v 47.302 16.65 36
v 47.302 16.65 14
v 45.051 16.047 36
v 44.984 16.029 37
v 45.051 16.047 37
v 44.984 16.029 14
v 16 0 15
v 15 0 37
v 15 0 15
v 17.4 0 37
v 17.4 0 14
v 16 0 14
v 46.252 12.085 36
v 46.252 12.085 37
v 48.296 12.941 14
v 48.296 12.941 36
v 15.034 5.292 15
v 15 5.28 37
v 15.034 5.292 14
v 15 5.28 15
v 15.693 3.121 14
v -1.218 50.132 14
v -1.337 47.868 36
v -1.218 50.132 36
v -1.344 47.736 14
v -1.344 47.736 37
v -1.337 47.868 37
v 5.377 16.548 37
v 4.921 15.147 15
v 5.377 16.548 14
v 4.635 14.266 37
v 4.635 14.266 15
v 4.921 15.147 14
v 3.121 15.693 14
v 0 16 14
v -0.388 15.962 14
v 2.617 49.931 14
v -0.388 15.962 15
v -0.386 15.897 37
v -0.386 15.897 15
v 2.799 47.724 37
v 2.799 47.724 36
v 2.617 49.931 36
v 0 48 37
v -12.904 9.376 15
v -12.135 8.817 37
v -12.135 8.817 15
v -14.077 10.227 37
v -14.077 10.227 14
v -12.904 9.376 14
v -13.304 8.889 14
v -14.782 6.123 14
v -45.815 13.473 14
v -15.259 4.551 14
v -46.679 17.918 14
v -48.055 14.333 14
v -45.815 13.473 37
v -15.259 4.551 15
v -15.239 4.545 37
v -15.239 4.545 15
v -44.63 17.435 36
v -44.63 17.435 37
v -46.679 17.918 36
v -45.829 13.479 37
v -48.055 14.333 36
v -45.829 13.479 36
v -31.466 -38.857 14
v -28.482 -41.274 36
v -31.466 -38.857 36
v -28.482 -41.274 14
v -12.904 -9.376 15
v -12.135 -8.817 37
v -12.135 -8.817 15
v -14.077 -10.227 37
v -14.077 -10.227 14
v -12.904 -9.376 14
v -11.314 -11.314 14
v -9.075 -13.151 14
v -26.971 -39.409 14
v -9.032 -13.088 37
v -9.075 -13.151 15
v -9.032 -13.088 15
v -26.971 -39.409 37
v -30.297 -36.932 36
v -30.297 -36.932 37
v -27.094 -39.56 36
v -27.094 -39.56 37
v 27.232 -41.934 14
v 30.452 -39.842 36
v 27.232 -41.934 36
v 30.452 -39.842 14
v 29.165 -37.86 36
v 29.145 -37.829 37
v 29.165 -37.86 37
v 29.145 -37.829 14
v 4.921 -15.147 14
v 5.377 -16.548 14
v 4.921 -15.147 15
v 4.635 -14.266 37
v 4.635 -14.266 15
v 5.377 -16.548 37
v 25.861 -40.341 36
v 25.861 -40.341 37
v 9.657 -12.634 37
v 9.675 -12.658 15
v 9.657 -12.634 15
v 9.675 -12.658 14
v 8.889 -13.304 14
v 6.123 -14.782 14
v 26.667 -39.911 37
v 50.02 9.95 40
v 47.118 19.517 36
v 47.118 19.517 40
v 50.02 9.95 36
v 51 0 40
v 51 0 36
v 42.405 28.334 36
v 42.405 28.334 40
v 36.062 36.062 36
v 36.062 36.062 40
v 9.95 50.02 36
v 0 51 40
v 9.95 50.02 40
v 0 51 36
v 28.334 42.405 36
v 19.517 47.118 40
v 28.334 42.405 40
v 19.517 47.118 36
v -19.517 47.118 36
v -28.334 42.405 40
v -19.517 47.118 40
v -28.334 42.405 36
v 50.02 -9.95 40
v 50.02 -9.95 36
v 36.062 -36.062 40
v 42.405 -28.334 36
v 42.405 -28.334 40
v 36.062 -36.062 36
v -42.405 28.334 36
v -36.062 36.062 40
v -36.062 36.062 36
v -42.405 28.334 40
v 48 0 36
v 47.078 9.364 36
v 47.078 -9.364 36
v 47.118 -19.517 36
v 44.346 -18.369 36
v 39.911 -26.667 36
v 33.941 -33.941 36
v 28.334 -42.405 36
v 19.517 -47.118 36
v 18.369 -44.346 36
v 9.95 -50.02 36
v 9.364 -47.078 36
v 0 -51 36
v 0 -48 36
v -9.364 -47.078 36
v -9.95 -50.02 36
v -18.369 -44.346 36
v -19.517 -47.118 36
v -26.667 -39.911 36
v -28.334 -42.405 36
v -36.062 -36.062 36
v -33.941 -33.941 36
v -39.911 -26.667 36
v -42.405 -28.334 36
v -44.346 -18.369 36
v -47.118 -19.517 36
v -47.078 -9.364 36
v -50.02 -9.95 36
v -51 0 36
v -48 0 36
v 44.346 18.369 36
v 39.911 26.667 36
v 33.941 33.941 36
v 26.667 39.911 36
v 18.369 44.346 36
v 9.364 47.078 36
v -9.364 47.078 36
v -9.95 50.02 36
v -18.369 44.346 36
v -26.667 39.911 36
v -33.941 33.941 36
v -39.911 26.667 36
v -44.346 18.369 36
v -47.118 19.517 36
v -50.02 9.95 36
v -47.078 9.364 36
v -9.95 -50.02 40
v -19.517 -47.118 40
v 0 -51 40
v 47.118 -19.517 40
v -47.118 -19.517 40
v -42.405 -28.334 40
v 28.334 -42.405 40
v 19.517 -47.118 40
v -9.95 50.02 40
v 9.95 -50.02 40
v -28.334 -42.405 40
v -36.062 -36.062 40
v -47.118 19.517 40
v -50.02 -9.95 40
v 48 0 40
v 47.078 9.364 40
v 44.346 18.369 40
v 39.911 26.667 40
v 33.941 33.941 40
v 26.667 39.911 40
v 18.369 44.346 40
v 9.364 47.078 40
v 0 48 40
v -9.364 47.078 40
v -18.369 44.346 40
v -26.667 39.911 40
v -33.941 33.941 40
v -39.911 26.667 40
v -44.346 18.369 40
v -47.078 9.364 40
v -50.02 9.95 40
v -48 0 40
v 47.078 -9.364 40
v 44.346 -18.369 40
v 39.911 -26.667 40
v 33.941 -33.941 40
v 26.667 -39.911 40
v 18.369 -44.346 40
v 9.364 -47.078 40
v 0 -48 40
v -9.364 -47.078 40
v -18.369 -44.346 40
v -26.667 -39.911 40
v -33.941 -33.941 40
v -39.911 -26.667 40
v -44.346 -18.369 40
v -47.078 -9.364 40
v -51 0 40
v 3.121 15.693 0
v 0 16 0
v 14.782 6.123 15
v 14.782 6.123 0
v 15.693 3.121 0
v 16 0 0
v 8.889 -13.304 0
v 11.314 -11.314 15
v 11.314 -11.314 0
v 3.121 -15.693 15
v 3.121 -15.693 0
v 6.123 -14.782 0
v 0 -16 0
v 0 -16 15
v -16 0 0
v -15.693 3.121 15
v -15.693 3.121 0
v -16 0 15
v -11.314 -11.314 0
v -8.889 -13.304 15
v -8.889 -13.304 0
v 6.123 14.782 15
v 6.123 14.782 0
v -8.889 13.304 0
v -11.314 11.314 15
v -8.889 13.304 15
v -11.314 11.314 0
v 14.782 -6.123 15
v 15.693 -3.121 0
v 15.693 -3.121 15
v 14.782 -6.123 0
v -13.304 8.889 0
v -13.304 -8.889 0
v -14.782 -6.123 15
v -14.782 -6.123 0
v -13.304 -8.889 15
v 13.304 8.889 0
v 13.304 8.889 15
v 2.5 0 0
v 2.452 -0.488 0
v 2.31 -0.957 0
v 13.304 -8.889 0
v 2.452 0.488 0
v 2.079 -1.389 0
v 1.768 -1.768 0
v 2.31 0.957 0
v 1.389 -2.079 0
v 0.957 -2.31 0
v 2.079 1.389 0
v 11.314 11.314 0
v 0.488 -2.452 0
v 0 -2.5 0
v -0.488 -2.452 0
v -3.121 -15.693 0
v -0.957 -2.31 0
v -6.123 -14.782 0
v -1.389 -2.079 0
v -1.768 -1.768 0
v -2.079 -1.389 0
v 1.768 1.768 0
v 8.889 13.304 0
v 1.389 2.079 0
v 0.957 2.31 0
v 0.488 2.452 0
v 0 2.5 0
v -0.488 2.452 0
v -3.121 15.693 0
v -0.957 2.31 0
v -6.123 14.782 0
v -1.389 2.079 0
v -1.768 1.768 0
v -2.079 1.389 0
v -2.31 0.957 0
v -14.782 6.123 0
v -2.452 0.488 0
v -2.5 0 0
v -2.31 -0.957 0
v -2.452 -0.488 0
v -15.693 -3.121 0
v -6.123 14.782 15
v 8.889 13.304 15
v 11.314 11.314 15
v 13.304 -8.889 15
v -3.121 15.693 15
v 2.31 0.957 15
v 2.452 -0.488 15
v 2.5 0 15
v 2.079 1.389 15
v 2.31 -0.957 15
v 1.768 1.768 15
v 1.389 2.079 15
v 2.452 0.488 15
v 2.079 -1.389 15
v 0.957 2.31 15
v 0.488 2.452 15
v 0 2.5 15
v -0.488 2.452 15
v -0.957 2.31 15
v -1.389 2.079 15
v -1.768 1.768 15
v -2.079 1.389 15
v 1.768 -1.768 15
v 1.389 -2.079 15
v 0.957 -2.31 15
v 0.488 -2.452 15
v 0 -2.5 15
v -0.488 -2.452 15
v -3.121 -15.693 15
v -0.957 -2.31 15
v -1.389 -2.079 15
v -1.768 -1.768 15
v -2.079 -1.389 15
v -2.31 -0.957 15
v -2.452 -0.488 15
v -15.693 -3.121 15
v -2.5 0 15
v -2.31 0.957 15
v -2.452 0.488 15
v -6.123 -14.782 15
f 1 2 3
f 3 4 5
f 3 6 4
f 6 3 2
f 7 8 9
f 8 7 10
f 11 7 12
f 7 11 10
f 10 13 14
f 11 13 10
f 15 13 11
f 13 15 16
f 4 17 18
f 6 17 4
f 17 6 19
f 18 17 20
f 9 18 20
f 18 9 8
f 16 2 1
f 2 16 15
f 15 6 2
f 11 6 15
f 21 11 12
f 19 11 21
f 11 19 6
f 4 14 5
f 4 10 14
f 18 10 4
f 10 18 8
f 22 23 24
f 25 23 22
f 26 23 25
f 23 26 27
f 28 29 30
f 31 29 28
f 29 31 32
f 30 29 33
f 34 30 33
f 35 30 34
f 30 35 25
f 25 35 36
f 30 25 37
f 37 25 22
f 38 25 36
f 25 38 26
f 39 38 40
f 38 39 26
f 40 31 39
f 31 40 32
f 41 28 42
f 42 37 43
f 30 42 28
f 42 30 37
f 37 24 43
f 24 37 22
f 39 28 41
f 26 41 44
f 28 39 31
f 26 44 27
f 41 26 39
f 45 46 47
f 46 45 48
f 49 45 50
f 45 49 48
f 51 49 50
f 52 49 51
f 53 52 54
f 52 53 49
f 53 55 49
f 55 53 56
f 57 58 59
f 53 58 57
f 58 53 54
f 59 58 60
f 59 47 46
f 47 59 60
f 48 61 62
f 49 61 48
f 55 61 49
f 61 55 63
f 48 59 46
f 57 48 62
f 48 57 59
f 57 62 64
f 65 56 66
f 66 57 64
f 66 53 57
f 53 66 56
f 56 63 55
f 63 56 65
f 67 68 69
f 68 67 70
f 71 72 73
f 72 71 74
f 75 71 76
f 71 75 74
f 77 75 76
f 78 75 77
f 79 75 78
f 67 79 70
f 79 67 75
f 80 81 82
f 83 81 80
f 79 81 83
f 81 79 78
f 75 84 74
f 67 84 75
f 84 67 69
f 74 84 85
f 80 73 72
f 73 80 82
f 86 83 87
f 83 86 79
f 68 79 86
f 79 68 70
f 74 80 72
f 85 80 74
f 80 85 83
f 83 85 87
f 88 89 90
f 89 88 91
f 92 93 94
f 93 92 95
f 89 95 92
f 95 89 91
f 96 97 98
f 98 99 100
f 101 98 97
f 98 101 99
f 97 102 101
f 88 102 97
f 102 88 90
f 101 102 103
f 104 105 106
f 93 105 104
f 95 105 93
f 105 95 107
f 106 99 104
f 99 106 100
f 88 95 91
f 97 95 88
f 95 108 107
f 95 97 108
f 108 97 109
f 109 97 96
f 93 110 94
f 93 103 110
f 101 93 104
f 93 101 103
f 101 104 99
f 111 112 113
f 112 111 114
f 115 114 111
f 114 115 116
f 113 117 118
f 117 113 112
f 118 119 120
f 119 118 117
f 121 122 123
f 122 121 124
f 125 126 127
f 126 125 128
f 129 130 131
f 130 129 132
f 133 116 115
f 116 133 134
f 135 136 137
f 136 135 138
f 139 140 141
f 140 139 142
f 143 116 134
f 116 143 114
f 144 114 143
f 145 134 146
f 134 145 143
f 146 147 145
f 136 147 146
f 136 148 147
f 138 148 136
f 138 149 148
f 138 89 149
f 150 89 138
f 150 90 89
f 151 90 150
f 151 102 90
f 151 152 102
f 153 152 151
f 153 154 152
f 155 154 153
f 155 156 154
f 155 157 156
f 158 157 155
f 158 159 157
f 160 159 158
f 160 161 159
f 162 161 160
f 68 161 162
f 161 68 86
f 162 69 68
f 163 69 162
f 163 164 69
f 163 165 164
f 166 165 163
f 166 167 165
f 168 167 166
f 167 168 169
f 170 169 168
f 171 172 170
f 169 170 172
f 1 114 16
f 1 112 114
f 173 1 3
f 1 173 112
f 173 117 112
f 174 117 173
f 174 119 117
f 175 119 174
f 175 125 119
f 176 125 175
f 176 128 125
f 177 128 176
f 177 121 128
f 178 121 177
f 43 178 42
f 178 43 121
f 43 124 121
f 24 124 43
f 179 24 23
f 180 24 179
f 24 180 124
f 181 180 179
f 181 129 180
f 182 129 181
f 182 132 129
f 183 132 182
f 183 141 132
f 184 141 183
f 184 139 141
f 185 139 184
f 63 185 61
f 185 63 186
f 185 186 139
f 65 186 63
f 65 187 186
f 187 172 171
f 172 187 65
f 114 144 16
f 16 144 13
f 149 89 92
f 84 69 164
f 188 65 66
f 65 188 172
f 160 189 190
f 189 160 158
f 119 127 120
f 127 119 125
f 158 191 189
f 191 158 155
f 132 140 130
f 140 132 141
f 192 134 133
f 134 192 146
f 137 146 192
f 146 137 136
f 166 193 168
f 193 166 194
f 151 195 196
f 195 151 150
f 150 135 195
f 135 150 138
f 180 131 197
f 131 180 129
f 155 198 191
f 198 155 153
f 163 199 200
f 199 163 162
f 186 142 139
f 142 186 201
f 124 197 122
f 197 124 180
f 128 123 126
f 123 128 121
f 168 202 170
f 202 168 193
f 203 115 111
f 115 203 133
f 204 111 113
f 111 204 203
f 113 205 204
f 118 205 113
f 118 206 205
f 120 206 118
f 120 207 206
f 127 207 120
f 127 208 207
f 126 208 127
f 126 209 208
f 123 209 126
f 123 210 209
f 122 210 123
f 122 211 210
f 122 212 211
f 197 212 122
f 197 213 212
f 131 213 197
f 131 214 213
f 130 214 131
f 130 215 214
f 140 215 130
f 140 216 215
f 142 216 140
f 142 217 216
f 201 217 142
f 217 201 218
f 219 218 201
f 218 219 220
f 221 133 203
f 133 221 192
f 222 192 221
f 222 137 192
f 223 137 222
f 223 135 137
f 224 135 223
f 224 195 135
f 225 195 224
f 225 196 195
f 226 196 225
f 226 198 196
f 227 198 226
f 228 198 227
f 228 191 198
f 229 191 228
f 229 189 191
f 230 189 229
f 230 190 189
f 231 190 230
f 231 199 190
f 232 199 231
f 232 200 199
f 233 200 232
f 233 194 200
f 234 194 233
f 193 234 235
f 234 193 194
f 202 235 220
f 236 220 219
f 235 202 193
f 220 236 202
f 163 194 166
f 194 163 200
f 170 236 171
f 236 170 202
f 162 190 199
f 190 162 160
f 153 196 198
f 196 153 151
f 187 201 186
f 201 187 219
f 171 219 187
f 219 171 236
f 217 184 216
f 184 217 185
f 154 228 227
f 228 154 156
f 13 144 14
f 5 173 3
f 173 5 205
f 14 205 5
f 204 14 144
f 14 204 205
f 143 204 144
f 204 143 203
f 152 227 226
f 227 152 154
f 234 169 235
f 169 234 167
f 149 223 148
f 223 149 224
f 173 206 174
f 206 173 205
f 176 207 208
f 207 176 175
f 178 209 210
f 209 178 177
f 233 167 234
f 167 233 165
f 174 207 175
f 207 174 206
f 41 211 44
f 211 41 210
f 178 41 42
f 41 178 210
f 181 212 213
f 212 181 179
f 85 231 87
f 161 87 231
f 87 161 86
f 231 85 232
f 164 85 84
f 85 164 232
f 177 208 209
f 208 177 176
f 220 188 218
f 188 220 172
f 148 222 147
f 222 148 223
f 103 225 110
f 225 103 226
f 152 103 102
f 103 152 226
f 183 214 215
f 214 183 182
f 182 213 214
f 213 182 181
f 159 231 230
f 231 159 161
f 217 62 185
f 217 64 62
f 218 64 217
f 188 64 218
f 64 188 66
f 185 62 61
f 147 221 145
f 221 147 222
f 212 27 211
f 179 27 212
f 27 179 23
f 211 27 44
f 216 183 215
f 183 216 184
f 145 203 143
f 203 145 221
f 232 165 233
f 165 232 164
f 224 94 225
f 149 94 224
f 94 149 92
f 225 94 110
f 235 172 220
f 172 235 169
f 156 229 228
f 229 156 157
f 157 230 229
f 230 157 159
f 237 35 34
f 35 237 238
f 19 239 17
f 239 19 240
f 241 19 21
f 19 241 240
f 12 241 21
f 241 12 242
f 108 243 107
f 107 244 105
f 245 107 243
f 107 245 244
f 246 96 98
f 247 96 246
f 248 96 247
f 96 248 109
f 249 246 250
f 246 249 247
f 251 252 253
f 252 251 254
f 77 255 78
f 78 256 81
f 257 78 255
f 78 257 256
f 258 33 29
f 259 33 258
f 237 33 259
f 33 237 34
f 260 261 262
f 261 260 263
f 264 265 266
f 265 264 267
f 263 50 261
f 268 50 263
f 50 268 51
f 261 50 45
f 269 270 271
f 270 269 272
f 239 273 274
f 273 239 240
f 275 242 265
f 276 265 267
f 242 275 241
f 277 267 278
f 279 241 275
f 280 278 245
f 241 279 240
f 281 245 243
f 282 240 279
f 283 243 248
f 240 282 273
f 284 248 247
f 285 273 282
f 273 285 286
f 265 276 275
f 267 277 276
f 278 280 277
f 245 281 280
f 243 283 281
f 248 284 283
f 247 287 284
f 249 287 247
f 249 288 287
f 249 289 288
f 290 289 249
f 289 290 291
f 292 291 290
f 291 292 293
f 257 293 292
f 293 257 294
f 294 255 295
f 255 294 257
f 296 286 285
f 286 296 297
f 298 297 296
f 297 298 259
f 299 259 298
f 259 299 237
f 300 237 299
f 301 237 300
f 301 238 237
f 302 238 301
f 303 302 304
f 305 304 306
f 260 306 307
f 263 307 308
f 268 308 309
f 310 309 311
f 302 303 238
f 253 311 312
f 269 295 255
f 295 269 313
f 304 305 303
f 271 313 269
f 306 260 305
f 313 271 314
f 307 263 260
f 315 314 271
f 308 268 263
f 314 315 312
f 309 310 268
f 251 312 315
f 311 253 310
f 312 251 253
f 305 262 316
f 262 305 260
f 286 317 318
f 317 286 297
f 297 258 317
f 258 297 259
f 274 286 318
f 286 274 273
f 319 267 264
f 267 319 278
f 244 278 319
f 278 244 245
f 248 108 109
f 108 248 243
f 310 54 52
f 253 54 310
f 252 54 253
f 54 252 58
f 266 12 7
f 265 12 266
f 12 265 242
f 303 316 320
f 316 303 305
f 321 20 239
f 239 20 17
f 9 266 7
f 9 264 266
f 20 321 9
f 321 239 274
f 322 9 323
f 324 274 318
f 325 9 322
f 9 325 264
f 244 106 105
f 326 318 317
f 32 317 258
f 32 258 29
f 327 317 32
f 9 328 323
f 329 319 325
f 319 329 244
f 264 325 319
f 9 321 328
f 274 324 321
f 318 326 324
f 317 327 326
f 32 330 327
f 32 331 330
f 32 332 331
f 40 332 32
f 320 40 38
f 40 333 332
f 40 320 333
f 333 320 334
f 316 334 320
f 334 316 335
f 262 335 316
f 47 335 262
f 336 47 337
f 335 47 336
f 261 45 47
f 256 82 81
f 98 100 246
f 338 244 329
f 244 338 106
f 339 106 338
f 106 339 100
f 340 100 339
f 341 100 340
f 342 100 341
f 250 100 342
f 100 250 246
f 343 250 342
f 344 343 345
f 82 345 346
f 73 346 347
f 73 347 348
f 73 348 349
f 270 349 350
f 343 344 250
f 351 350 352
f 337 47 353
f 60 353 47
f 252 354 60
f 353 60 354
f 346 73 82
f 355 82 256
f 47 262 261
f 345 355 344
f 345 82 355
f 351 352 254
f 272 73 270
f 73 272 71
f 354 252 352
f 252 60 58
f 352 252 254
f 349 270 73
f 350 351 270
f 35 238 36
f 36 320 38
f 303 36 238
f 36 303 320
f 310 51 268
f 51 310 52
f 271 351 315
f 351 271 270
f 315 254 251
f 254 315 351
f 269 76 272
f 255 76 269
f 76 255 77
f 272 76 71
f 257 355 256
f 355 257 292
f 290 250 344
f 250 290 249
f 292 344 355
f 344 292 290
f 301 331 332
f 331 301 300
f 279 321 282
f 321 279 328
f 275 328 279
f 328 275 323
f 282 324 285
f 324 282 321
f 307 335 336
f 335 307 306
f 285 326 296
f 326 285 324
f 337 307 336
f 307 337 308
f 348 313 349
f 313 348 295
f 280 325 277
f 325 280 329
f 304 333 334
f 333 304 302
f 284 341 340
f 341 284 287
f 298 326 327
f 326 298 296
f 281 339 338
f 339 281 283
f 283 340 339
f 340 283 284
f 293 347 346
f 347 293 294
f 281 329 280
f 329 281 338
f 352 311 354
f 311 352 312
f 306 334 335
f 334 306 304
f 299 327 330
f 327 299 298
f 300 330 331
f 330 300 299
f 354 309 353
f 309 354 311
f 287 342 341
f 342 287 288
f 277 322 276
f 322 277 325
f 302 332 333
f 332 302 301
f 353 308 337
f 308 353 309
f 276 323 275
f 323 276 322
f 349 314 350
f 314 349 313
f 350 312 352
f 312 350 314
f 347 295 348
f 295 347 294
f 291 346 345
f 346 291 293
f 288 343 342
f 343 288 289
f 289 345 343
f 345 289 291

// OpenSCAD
$fn = 32;

// ----------------------------------------------------------------------
// Impeller: 100 mm, 5 blades, 40 mm tall
// ----------------------------------------------------------------------

// --- parameters (mm) ---
center_d = 32;            // hub diameter
center_h = 15;            // hub height
wheel_d = 100;            // outer diameter over the blades
blade_count = 5;          // number of blades
blade_t = 2.4;            // blade thickness
blade_h = 22;             // blade height
blade_in_r = 15;          // blade root radius
blade_out_r = 47.6;       // blade tip radius
sweep = 15;               // blade sweep, degrees
bore_d = 5;               // shaft bore
shroud_h = 3;             // shroud ring thickness
shroud_d = 102;           // shroud outside diameter

module hub() {
  cylinder(h = center_h, d = center_d);
}

module blade() {
  /* blade swept between two boxes: hull of the root and the tip section */
  hull() {
    translate([blade_in_r, 0, center_h - 1])
      cube([blade_t, blade_t * 2.2, blade_h + 1], center = false);
    rotate([0, 0, sweep])
      translate([blade_out_r, 0, center_h - 1])
        cube([blade_t, blade_t * 1.6, blade_h + 1], center = false);
  }
}

module blades() {
  for (i = [0 : blade_count - 1])
    rotate([0, 0, i * 360 / blade_count]) blade();
}

module shroud() {
  translate([0, 0, center_h + blade_h - 1])
    difference() {
      cylinder(h = shroud_h + 1, d = shroud_d);
      translate([0, 0, -1]) cylinder(h = shroud_h + 3, d = shroud_d - 2 * 3);
    }
}

difference() {
  union() {
    hub();
    blades();
    shroud();
  }
  translate([0, 0, -1]) cylinder(h = center_h + blade_h + shroud_h + 3, d = bore_d);
}
